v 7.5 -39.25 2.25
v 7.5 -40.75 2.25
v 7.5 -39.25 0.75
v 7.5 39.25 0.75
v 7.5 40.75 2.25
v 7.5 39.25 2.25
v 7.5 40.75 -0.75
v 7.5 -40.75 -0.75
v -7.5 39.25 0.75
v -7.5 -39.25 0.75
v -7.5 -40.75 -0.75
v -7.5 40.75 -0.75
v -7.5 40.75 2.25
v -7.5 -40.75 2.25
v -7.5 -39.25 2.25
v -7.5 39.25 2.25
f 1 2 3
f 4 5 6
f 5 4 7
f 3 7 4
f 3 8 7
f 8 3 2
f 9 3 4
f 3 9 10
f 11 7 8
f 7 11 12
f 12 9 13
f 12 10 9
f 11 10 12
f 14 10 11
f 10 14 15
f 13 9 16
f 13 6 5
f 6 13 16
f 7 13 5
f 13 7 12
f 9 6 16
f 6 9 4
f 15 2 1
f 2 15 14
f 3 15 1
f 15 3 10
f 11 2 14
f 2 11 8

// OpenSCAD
thickness = 1.5;
width = 15;
height = 80;

cube(size=[width, height, thickness], center=true);

//translate([width/2-thickness/2, 0, thickness/2])
//cube(size=[thickness, height, 2 * thickness], center=true);

translate([0, height/2, thickness/2])
cube(size=[width, thickness, 2 * thickness], center=true);

translate([0, -height/2, thickness/2])
cube(size=[width, thickness, 2 * thickness], center=true);
